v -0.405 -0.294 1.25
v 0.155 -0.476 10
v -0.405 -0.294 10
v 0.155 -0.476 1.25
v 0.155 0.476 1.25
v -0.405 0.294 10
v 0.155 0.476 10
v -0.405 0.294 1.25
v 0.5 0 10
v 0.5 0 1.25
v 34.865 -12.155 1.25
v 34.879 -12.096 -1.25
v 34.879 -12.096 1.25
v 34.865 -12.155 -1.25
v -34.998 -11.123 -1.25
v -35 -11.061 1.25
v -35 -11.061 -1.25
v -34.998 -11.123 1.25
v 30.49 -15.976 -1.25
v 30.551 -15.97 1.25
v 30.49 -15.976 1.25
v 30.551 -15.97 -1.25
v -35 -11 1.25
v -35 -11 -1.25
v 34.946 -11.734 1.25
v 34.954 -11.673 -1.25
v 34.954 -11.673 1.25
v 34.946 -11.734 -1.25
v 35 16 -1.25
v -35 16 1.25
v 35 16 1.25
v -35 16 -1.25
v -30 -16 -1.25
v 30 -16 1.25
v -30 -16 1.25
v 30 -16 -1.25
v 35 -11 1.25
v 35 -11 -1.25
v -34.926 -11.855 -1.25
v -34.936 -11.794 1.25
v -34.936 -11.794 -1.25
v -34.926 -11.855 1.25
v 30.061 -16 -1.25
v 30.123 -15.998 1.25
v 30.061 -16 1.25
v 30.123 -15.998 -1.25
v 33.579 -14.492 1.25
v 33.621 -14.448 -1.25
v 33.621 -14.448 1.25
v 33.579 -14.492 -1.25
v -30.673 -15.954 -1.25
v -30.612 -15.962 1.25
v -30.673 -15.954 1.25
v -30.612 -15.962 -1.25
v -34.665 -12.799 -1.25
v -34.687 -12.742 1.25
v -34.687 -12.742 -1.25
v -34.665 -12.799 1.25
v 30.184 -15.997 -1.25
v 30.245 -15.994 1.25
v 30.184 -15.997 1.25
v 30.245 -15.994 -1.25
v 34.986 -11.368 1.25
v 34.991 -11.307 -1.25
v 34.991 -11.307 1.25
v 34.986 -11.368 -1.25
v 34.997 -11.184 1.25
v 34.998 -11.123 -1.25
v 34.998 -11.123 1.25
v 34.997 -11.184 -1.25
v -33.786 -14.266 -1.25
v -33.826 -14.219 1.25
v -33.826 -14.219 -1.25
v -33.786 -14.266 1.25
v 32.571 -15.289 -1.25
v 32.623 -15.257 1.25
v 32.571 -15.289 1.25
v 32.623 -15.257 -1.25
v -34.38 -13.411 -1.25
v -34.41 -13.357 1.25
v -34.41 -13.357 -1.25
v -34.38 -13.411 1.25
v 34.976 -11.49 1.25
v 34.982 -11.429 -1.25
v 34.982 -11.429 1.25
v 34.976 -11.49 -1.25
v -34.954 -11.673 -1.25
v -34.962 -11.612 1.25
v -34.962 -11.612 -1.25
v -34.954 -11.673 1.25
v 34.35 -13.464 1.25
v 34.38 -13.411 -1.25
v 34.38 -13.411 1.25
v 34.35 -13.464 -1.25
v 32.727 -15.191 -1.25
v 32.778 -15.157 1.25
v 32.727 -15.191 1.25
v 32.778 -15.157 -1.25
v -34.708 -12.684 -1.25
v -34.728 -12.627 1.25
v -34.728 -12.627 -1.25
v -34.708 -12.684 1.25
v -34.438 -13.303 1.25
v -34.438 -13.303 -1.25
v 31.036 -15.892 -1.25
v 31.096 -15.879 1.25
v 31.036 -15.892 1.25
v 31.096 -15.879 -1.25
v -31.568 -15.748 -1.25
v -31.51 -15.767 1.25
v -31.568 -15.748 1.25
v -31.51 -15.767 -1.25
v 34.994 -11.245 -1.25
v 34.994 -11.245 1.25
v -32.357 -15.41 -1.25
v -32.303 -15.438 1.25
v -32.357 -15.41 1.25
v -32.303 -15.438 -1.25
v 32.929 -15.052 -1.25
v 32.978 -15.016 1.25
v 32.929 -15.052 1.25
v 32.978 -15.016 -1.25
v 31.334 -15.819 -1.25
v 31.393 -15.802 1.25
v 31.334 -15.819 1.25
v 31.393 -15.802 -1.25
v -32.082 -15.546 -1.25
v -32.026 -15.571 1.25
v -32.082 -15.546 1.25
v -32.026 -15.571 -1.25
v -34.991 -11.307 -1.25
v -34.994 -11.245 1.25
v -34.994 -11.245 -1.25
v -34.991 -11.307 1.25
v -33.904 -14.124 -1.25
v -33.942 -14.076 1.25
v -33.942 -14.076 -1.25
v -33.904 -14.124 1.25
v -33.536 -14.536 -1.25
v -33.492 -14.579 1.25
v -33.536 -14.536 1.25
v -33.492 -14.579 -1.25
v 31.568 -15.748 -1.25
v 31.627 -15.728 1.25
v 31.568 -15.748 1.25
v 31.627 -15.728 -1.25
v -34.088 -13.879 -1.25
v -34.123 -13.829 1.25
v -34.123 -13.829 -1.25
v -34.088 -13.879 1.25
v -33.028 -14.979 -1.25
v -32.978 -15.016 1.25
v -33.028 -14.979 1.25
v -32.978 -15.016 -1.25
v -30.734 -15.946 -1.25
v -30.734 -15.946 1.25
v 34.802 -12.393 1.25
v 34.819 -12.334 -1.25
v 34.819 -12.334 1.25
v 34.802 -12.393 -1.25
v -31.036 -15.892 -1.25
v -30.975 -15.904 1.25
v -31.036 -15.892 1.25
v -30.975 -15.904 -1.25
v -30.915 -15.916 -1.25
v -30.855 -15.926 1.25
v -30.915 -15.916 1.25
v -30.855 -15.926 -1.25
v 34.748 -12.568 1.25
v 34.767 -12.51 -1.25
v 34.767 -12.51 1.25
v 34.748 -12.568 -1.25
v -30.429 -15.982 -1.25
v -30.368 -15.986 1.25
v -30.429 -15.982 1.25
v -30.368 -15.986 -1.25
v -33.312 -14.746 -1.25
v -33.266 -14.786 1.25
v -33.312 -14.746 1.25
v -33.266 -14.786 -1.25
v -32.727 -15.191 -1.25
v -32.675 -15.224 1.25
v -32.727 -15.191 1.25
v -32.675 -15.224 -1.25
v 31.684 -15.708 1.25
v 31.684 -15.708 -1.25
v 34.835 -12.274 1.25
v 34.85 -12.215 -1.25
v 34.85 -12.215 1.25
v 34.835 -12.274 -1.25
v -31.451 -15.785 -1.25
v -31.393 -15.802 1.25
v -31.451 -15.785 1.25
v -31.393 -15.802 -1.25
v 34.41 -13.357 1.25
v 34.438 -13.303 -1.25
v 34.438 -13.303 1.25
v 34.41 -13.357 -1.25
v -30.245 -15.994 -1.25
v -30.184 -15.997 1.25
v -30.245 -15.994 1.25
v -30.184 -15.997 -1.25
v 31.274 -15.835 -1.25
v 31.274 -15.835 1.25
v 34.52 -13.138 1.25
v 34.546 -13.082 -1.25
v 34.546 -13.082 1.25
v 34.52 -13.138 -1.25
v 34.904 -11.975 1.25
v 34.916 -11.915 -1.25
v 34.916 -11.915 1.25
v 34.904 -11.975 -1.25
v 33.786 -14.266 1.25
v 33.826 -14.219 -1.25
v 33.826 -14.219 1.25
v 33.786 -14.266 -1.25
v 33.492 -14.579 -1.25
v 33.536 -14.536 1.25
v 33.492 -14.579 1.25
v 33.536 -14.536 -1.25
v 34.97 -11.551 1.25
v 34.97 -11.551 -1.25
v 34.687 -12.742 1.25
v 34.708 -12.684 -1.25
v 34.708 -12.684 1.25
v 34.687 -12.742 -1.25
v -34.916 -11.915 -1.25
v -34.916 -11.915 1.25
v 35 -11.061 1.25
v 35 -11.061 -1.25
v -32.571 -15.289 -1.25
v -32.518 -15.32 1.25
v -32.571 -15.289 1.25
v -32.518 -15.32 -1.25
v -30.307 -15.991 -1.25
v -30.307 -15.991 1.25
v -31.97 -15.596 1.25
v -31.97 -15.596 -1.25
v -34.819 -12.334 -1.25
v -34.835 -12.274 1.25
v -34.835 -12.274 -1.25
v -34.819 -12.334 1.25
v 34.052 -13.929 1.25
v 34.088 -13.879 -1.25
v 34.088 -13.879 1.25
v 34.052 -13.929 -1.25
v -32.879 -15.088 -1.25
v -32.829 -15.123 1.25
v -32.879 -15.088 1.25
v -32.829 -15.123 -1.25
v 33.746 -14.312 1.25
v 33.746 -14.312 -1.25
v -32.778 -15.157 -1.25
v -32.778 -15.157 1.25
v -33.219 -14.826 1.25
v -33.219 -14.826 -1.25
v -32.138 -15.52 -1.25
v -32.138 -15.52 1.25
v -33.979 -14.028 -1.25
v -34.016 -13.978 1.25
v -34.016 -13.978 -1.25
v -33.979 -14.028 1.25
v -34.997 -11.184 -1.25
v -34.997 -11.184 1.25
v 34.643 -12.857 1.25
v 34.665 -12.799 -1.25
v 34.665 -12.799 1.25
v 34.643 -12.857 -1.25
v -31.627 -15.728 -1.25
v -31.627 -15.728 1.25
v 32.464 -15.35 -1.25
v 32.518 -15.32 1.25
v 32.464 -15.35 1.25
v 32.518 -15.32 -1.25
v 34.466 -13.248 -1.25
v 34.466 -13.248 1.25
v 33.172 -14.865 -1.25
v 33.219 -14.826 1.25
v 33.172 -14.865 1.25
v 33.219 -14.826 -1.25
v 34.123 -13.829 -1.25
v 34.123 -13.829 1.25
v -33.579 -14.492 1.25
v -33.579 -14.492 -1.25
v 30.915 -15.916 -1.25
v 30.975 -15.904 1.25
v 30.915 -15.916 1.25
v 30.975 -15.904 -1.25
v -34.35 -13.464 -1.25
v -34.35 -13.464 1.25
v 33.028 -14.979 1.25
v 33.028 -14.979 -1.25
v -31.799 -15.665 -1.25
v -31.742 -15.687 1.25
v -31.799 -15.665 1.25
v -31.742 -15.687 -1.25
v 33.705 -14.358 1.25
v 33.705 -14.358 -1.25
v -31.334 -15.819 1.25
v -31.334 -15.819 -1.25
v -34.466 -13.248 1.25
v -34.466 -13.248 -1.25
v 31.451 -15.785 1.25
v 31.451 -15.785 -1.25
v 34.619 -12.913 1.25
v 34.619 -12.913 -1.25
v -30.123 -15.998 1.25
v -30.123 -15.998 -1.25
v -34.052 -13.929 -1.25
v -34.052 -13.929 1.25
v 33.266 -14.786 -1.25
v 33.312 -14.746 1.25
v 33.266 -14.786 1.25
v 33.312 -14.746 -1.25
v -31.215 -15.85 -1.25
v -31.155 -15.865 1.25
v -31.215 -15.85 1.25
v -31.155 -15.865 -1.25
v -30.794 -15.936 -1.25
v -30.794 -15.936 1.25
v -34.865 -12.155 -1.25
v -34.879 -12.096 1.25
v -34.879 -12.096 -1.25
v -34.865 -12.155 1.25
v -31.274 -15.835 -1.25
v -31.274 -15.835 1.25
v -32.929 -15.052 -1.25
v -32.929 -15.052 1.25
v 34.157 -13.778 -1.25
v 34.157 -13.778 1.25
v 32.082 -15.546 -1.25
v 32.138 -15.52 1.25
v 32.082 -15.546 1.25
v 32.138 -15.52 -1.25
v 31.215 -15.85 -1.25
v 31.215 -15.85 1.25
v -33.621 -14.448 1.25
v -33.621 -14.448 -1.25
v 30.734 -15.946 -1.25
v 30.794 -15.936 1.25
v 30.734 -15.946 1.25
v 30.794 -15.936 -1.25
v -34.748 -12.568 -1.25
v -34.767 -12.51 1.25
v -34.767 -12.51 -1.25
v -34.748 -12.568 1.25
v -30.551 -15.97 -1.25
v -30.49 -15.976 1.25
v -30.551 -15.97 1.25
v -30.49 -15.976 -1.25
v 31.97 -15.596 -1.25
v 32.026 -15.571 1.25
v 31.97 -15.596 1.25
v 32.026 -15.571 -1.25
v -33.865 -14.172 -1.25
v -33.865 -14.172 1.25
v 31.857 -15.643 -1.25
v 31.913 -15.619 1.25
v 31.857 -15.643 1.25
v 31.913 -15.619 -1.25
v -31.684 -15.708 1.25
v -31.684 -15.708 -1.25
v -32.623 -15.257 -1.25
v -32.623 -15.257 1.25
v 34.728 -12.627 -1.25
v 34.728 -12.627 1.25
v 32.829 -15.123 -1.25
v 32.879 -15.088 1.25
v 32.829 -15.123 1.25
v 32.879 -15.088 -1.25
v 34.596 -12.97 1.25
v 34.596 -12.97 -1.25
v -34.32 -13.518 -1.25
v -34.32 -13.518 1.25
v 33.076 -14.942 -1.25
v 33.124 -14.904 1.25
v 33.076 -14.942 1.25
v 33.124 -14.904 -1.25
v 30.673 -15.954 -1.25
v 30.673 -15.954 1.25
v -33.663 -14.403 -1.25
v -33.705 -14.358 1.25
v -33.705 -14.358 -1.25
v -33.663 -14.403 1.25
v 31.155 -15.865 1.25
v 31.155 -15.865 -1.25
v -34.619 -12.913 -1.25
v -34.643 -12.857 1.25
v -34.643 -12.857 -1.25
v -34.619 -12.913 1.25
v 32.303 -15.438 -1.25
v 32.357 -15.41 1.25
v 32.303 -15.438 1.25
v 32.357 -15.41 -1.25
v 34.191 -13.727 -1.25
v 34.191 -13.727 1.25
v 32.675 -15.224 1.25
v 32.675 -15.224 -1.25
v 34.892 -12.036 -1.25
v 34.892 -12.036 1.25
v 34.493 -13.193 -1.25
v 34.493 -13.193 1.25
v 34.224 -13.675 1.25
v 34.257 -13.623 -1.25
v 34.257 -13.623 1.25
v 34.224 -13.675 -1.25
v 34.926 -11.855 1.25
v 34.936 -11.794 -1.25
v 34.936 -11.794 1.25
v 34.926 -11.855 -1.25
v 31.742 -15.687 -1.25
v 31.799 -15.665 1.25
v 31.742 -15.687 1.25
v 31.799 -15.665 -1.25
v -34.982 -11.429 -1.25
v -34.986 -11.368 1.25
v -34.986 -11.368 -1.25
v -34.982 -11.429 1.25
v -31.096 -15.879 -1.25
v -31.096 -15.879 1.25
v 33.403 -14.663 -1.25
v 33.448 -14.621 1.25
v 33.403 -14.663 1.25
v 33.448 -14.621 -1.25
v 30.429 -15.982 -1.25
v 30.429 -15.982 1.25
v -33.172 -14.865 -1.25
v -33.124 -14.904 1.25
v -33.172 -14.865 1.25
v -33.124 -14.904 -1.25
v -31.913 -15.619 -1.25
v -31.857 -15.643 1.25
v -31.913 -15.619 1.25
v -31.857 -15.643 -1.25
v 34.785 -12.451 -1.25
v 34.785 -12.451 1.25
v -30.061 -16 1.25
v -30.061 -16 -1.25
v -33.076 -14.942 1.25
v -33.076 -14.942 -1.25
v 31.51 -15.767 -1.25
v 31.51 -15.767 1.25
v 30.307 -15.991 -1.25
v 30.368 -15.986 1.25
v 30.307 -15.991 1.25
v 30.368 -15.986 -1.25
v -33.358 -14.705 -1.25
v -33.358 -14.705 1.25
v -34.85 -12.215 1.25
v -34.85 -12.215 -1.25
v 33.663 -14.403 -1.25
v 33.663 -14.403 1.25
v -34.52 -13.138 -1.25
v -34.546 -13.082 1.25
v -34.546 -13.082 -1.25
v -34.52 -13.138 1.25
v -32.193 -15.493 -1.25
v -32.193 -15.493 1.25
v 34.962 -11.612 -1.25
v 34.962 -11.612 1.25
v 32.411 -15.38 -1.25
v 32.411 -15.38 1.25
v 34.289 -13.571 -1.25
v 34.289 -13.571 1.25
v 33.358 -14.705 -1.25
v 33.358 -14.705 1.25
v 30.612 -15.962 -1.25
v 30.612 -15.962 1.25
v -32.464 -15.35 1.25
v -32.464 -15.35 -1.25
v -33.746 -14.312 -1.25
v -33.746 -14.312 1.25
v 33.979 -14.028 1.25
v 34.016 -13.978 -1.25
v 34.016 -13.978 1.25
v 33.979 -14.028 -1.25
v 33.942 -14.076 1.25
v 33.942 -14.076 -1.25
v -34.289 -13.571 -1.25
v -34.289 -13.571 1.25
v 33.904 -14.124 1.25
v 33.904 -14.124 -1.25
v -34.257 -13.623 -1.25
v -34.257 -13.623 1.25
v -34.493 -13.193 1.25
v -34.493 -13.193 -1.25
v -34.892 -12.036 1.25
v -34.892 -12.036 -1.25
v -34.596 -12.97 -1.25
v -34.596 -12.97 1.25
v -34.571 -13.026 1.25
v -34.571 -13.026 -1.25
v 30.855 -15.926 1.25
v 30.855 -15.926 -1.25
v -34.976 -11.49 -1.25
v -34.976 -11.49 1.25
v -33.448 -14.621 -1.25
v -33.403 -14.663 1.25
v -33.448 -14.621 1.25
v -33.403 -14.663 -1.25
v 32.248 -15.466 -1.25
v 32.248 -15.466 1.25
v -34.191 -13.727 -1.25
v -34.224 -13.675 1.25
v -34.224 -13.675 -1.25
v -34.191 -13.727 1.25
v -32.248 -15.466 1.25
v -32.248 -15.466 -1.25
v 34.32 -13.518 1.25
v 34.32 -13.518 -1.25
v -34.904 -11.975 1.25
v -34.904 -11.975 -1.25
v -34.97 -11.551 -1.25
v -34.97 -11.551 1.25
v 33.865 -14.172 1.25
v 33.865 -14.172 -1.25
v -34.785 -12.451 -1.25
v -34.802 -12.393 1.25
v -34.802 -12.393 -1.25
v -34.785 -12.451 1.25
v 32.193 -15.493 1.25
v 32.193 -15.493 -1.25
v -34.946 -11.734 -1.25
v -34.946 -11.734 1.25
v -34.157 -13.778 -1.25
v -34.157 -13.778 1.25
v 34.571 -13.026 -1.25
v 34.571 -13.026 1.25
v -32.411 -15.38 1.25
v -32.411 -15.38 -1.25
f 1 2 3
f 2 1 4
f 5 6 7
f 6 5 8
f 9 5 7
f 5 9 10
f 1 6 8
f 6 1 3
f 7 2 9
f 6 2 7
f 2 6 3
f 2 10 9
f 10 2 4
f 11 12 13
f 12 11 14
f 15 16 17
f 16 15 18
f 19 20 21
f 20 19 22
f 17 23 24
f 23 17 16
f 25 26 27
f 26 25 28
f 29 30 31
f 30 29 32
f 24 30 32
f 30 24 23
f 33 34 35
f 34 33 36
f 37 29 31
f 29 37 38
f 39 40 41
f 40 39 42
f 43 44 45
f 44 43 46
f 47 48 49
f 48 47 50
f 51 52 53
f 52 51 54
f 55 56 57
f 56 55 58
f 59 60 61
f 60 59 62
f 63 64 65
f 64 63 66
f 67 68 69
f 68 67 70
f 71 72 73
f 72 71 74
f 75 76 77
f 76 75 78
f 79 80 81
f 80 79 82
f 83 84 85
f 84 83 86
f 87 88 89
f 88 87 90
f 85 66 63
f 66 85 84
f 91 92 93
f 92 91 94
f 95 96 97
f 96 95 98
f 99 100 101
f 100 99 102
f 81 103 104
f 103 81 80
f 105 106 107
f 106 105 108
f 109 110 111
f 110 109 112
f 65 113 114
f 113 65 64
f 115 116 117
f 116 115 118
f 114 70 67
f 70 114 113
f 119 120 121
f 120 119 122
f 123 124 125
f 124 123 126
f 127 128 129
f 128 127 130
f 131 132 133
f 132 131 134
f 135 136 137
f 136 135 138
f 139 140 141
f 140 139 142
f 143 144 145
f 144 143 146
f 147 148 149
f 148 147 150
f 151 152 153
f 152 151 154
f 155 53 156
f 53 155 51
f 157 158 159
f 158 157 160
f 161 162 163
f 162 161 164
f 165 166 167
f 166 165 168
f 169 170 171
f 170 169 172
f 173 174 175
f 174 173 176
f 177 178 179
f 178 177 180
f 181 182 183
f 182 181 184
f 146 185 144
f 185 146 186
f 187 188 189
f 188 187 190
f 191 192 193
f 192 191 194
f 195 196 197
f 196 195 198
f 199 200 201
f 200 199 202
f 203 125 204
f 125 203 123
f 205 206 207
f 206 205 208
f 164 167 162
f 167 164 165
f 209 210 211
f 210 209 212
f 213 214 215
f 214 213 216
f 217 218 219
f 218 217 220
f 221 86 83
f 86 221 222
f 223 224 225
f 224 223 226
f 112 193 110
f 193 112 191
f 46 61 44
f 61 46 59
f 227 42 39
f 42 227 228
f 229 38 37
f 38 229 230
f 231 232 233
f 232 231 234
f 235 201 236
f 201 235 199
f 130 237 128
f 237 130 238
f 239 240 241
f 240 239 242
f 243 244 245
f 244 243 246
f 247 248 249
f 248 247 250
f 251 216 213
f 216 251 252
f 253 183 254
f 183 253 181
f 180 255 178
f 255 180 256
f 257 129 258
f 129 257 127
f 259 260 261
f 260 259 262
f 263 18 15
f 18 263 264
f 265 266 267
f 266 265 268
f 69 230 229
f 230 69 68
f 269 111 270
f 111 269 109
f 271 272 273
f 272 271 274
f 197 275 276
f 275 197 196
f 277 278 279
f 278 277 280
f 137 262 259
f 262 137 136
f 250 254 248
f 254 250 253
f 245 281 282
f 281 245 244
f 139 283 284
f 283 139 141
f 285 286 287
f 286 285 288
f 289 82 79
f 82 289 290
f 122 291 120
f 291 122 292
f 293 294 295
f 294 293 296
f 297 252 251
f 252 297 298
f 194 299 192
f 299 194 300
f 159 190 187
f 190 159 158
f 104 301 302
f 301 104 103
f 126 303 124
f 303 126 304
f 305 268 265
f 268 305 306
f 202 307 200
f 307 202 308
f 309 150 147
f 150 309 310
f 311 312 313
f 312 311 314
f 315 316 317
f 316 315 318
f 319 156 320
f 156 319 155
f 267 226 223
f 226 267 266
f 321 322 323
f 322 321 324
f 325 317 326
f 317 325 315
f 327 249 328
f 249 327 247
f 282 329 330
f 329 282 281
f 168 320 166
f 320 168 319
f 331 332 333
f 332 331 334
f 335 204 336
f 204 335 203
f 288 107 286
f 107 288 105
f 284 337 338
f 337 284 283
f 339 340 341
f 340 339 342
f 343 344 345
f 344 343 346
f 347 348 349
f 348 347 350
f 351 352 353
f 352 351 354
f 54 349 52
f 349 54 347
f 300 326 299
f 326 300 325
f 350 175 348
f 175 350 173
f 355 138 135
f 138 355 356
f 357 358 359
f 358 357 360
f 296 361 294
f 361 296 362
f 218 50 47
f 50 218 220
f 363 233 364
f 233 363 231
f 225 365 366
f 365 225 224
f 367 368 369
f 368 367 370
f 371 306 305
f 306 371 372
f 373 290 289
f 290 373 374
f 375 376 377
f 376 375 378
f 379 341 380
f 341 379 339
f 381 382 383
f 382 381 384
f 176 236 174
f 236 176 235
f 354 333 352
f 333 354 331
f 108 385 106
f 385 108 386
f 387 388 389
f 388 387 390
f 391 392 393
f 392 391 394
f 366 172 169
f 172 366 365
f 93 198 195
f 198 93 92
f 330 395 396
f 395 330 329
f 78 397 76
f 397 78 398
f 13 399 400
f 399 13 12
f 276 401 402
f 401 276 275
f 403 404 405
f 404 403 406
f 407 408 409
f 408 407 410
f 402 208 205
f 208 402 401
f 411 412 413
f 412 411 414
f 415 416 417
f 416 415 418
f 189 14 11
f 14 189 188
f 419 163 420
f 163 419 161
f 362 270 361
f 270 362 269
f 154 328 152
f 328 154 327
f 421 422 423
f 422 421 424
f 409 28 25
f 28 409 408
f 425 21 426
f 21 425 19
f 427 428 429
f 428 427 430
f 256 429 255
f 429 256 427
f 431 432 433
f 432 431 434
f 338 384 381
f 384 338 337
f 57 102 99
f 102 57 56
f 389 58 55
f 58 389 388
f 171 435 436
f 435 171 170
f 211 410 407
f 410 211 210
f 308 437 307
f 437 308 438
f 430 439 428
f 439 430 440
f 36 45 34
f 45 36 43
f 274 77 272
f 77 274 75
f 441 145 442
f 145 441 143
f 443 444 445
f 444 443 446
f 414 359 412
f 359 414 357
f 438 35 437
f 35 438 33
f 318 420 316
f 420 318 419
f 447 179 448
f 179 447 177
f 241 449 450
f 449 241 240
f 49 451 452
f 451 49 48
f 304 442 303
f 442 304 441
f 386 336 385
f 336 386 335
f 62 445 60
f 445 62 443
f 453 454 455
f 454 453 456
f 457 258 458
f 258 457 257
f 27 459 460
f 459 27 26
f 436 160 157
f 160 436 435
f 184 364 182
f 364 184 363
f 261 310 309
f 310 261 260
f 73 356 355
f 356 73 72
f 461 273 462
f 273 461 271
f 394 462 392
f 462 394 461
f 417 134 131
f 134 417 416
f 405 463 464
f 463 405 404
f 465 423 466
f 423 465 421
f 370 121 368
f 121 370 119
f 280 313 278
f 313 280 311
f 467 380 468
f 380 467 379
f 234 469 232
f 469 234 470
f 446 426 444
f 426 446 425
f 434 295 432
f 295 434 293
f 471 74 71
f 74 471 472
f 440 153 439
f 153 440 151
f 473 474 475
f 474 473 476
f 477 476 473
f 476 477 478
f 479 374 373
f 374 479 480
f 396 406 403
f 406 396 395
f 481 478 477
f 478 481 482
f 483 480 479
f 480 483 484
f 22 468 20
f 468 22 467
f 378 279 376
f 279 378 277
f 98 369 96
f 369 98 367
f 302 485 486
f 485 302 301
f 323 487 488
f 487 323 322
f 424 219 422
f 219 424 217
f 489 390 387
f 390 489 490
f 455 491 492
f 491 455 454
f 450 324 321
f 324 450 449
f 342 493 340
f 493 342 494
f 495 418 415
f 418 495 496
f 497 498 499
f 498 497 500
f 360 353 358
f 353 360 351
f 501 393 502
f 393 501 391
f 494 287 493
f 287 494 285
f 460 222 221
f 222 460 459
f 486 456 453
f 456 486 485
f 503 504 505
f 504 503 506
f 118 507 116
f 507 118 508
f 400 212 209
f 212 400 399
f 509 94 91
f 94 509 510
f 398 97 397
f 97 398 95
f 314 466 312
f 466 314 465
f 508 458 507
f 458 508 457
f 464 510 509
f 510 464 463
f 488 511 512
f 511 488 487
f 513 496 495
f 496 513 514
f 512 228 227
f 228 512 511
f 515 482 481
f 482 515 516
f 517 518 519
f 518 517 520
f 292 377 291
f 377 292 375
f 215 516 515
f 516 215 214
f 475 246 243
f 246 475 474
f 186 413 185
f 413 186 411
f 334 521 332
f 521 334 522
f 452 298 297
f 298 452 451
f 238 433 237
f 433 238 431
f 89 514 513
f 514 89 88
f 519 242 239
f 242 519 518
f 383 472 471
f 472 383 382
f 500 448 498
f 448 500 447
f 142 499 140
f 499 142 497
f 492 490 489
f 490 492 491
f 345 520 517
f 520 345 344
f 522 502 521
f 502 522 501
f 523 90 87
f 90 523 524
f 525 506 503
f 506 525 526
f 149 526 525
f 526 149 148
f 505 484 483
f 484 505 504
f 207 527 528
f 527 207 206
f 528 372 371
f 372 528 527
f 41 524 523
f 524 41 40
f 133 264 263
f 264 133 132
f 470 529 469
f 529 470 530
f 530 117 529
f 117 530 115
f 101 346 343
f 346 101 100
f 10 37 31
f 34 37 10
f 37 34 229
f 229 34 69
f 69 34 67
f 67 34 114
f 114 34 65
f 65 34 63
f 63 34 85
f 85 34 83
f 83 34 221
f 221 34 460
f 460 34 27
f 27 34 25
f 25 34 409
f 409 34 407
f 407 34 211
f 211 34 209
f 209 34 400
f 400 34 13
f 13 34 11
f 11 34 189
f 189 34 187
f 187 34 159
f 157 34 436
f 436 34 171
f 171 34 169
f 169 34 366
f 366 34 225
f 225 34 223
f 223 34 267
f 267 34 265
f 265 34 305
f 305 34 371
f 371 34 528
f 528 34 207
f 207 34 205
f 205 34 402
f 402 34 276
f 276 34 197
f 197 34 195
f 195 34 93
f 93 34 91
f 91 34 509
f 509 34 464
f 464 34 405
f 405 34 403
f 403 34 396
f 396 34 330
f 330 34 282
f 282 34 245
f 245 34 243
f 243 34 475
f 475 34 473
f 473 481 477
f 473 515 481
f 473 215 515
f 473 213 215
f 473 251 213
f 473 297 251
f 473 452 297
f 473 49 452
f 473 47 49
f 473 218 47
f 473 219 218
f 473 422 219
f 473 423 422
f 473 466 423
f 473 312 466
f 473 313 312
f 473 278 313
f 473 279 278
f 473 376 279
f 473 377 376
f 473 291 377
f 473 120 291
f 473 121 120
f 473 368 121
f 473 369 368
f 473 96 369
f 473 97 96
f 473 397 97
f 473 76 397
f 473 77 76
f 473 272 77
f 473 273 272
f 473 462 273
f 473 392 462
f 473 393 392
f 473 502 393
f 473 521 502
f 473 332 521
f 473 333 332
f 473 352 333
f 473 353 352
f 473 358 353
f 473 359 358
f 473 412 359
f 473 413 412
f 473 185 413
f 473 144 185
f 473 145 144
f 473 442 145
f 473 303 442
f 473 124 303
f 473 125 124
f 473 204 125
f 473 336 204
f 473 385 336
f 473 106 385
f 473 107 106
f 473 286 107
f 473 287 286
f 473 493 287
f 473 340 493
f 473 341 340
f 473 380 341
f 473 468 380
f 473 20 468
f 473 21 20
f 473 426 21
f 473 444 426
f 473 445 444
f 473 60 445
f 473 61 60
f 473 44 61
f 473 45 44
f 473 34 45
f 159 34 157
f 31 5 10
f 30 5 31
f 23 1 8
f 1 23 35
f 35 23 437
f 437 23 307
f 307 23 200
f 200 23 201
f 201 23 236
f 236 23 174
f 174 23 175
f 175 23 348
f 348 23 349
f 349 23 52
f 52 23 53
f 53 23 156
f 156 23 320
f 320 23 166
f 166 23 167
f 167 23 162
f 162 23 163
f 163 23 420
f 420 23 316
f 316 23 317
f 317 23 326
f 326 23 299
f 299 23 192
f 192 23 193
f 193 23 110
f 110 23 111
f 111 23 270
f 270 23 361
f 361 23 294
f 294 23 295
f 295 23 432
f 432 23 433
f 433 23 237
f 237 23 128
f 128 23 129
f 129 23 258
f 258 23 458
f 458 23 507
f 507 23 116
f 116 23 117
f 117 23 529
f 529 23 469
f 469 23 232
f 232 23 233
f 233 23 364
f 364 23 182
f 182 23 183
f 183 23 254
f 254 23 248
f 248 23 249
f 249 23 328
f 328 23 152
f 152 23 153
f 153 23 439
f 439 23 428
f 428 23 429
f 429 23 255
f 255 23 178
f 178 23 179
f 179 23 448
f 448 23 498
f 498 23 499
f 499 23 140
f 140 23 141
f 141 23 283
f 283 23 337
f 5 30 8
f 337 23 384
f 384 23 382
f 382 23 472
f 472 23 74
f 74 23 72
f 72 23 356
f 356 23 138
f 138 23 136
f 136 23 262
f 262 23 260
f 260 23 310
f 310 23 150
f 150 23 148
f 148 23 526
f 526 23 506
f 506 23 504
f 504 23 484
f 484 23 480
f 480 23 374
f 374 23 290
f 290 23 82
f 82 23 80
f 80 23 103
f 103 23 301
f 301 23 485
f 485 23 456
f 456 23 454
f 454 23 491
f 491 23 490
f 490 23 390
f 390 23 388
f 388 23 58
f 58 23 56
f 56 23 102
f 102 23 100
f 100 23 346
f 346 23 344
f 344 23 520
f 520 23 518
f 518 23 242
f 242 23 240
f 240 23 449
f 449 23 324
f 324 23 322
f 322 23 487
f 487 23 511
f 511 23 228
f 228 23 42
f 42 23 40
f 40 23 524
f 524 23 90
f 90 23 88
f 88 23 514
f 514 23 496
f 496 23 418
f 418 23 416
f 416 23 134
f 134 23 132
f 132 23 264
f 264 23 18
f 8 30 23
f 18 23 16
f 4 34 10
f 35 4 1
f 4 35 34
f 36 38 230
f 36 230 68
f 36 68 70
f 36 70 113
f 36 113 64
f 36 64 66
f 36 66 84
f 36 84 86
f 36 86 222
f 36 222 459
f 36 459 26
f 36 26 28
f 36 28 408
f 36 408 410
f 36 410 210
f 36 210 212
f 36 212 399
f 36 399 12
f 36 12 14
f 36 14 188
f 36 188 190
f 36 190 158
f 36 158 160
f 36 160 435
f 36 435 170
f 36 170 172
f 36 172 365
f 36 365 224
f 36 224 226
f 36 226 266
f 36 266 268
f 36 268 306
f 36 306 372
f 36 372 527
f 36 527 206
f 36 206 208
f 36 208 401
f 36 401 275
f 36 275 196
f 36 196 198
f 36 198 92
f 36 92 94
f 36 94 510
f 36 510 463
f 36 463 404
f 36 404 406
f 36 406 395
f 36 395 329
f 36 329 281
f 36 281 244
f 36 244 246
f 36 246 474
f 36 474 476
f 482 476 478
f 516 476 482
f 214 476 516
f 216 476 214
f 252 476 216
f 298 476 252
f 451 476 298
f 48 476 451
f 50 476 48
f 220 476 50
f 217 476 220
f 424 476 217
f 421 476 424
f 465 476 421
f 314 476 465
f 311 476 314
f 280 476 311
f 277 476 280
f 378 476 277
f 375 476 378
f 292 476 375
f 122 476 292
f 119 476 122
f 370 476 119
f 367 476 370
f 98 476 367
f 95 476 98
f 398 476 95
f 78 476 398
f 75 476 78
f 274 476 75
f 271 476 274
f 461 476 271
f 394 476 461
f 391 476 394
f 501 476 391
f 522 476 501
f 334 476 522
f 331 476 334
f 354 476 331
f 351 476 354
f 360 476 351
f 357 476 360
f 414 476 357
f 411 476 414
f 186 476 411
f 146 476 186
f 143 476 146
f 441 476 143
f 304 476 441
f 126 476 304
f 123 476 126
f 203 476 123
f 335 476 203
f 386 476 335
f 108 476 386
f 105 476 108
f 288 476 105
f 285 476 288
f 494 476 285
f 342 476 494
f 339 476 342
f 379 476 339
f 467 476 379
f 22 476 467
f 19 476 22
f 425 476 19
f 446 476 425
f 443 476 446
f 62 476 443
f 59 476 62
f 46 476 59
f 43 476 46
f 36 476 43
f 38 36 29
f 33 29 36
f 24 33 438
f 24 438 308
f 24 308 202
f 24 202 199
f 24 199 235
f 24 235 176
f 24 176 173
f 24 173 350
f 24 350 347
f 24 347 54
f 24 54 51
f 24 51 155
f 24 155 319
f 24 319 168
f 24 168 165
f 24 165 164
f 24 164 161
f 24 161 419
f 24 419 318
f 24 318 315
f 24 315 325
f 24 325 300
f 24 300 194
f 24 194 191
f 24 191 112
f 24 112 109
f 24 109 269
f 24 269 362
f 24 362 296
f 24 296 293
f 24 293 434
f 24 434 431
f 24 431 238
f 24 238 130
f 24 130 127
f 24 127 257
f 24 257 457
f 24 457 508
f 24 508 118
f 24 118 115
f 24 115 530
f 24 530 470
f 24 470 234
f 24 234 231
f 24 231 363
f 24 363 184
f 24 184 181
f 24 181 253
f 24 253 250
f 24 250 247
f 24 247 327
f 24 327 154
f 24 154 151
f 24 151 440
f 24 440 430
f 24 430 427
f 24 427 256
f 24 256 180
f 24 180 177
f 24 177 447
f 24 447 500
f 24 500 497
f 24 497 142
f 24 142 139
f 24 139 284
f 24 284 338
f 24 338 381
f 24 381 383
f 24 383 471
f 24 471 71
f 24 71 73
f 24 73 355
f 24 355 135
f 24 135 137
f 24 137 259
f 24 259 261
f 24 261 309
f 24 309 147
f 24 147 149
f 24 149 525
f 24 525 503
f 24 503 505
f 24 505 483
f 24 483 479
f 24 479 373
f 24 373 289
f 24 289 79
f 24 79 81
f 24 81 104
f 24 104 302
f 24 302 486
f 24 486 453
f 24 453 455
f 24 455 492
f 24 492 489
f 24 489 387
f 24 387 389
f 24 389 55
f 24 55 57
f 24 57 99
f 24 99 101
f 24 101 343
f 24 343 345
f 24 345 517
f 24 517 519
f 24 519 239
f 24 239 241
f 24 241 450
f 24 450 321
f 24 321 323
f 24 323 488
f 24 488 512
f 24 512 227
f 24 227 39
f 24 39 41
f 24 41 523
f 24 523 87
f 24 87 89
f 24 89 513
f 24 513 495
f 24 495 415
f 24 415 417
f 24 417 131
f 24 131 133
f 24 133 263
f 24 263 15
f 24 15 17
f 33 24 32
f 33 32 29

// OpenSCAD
debug_me = true;
circle_fn = 512;

module filament_swatch_2dbase(width = 70, height = 32, fillet=5, center=false) {
    r_adj = fillet * 2;
    fillet_diameter = fillet * 2;
    fillet_half = fillet / 2;

    t_x = center? 0 : width/2;
    t_y = center? fillet : -(height/2-fillet);
    t_z = 0;

//    translate([width/2,height/2+fillet,0]) {
    translate([t_x, t_y, t_z]) {
        translate([0, -fillet/2, 0])
            square([width, height-(fillet)], center=true);
        translate([0, -fillet, 0])
            square([width - fillet_diameter, height], center=true);

        translate([width/2 - fillet,-height/2, 0])
            circle(fillet, $fn=circle_fn);
        translate([-(width/2 - fillet),-height/2, 0])
            circle(fillet, $fn=circle_fn);
    }
}

module filament_swatch_extrude(width=70, height=32, depth=2.5, fillet=5, center=false) {
    t_z = center? -depth/2 : 0;
    translate([0,0,t_z])
        linear_extrude(depth)
            filament_swatch_2dbase(width=width, height=height, fillet=fillet, center=center);
}


module filament_swatch(center=false) {
    filament_swatch_extrude(center=center);
}

if (debug_me) {
    color([0,1,0])
    cylinder(h=10, r=0.5);
}

/*
linear_extrude(25) {
square([5,30], center=true);
circle(10, $fn=256);
}
*/

/*
linear_extrude(2.5)
    filament_swatch_2dbase(fillet=3, center=true);
*/
filament_swatch(center=true);
/*
color([0,1,0])
linear_extrude(2.5)
    filament_swatch_2dbase(fillet=3);
*/
